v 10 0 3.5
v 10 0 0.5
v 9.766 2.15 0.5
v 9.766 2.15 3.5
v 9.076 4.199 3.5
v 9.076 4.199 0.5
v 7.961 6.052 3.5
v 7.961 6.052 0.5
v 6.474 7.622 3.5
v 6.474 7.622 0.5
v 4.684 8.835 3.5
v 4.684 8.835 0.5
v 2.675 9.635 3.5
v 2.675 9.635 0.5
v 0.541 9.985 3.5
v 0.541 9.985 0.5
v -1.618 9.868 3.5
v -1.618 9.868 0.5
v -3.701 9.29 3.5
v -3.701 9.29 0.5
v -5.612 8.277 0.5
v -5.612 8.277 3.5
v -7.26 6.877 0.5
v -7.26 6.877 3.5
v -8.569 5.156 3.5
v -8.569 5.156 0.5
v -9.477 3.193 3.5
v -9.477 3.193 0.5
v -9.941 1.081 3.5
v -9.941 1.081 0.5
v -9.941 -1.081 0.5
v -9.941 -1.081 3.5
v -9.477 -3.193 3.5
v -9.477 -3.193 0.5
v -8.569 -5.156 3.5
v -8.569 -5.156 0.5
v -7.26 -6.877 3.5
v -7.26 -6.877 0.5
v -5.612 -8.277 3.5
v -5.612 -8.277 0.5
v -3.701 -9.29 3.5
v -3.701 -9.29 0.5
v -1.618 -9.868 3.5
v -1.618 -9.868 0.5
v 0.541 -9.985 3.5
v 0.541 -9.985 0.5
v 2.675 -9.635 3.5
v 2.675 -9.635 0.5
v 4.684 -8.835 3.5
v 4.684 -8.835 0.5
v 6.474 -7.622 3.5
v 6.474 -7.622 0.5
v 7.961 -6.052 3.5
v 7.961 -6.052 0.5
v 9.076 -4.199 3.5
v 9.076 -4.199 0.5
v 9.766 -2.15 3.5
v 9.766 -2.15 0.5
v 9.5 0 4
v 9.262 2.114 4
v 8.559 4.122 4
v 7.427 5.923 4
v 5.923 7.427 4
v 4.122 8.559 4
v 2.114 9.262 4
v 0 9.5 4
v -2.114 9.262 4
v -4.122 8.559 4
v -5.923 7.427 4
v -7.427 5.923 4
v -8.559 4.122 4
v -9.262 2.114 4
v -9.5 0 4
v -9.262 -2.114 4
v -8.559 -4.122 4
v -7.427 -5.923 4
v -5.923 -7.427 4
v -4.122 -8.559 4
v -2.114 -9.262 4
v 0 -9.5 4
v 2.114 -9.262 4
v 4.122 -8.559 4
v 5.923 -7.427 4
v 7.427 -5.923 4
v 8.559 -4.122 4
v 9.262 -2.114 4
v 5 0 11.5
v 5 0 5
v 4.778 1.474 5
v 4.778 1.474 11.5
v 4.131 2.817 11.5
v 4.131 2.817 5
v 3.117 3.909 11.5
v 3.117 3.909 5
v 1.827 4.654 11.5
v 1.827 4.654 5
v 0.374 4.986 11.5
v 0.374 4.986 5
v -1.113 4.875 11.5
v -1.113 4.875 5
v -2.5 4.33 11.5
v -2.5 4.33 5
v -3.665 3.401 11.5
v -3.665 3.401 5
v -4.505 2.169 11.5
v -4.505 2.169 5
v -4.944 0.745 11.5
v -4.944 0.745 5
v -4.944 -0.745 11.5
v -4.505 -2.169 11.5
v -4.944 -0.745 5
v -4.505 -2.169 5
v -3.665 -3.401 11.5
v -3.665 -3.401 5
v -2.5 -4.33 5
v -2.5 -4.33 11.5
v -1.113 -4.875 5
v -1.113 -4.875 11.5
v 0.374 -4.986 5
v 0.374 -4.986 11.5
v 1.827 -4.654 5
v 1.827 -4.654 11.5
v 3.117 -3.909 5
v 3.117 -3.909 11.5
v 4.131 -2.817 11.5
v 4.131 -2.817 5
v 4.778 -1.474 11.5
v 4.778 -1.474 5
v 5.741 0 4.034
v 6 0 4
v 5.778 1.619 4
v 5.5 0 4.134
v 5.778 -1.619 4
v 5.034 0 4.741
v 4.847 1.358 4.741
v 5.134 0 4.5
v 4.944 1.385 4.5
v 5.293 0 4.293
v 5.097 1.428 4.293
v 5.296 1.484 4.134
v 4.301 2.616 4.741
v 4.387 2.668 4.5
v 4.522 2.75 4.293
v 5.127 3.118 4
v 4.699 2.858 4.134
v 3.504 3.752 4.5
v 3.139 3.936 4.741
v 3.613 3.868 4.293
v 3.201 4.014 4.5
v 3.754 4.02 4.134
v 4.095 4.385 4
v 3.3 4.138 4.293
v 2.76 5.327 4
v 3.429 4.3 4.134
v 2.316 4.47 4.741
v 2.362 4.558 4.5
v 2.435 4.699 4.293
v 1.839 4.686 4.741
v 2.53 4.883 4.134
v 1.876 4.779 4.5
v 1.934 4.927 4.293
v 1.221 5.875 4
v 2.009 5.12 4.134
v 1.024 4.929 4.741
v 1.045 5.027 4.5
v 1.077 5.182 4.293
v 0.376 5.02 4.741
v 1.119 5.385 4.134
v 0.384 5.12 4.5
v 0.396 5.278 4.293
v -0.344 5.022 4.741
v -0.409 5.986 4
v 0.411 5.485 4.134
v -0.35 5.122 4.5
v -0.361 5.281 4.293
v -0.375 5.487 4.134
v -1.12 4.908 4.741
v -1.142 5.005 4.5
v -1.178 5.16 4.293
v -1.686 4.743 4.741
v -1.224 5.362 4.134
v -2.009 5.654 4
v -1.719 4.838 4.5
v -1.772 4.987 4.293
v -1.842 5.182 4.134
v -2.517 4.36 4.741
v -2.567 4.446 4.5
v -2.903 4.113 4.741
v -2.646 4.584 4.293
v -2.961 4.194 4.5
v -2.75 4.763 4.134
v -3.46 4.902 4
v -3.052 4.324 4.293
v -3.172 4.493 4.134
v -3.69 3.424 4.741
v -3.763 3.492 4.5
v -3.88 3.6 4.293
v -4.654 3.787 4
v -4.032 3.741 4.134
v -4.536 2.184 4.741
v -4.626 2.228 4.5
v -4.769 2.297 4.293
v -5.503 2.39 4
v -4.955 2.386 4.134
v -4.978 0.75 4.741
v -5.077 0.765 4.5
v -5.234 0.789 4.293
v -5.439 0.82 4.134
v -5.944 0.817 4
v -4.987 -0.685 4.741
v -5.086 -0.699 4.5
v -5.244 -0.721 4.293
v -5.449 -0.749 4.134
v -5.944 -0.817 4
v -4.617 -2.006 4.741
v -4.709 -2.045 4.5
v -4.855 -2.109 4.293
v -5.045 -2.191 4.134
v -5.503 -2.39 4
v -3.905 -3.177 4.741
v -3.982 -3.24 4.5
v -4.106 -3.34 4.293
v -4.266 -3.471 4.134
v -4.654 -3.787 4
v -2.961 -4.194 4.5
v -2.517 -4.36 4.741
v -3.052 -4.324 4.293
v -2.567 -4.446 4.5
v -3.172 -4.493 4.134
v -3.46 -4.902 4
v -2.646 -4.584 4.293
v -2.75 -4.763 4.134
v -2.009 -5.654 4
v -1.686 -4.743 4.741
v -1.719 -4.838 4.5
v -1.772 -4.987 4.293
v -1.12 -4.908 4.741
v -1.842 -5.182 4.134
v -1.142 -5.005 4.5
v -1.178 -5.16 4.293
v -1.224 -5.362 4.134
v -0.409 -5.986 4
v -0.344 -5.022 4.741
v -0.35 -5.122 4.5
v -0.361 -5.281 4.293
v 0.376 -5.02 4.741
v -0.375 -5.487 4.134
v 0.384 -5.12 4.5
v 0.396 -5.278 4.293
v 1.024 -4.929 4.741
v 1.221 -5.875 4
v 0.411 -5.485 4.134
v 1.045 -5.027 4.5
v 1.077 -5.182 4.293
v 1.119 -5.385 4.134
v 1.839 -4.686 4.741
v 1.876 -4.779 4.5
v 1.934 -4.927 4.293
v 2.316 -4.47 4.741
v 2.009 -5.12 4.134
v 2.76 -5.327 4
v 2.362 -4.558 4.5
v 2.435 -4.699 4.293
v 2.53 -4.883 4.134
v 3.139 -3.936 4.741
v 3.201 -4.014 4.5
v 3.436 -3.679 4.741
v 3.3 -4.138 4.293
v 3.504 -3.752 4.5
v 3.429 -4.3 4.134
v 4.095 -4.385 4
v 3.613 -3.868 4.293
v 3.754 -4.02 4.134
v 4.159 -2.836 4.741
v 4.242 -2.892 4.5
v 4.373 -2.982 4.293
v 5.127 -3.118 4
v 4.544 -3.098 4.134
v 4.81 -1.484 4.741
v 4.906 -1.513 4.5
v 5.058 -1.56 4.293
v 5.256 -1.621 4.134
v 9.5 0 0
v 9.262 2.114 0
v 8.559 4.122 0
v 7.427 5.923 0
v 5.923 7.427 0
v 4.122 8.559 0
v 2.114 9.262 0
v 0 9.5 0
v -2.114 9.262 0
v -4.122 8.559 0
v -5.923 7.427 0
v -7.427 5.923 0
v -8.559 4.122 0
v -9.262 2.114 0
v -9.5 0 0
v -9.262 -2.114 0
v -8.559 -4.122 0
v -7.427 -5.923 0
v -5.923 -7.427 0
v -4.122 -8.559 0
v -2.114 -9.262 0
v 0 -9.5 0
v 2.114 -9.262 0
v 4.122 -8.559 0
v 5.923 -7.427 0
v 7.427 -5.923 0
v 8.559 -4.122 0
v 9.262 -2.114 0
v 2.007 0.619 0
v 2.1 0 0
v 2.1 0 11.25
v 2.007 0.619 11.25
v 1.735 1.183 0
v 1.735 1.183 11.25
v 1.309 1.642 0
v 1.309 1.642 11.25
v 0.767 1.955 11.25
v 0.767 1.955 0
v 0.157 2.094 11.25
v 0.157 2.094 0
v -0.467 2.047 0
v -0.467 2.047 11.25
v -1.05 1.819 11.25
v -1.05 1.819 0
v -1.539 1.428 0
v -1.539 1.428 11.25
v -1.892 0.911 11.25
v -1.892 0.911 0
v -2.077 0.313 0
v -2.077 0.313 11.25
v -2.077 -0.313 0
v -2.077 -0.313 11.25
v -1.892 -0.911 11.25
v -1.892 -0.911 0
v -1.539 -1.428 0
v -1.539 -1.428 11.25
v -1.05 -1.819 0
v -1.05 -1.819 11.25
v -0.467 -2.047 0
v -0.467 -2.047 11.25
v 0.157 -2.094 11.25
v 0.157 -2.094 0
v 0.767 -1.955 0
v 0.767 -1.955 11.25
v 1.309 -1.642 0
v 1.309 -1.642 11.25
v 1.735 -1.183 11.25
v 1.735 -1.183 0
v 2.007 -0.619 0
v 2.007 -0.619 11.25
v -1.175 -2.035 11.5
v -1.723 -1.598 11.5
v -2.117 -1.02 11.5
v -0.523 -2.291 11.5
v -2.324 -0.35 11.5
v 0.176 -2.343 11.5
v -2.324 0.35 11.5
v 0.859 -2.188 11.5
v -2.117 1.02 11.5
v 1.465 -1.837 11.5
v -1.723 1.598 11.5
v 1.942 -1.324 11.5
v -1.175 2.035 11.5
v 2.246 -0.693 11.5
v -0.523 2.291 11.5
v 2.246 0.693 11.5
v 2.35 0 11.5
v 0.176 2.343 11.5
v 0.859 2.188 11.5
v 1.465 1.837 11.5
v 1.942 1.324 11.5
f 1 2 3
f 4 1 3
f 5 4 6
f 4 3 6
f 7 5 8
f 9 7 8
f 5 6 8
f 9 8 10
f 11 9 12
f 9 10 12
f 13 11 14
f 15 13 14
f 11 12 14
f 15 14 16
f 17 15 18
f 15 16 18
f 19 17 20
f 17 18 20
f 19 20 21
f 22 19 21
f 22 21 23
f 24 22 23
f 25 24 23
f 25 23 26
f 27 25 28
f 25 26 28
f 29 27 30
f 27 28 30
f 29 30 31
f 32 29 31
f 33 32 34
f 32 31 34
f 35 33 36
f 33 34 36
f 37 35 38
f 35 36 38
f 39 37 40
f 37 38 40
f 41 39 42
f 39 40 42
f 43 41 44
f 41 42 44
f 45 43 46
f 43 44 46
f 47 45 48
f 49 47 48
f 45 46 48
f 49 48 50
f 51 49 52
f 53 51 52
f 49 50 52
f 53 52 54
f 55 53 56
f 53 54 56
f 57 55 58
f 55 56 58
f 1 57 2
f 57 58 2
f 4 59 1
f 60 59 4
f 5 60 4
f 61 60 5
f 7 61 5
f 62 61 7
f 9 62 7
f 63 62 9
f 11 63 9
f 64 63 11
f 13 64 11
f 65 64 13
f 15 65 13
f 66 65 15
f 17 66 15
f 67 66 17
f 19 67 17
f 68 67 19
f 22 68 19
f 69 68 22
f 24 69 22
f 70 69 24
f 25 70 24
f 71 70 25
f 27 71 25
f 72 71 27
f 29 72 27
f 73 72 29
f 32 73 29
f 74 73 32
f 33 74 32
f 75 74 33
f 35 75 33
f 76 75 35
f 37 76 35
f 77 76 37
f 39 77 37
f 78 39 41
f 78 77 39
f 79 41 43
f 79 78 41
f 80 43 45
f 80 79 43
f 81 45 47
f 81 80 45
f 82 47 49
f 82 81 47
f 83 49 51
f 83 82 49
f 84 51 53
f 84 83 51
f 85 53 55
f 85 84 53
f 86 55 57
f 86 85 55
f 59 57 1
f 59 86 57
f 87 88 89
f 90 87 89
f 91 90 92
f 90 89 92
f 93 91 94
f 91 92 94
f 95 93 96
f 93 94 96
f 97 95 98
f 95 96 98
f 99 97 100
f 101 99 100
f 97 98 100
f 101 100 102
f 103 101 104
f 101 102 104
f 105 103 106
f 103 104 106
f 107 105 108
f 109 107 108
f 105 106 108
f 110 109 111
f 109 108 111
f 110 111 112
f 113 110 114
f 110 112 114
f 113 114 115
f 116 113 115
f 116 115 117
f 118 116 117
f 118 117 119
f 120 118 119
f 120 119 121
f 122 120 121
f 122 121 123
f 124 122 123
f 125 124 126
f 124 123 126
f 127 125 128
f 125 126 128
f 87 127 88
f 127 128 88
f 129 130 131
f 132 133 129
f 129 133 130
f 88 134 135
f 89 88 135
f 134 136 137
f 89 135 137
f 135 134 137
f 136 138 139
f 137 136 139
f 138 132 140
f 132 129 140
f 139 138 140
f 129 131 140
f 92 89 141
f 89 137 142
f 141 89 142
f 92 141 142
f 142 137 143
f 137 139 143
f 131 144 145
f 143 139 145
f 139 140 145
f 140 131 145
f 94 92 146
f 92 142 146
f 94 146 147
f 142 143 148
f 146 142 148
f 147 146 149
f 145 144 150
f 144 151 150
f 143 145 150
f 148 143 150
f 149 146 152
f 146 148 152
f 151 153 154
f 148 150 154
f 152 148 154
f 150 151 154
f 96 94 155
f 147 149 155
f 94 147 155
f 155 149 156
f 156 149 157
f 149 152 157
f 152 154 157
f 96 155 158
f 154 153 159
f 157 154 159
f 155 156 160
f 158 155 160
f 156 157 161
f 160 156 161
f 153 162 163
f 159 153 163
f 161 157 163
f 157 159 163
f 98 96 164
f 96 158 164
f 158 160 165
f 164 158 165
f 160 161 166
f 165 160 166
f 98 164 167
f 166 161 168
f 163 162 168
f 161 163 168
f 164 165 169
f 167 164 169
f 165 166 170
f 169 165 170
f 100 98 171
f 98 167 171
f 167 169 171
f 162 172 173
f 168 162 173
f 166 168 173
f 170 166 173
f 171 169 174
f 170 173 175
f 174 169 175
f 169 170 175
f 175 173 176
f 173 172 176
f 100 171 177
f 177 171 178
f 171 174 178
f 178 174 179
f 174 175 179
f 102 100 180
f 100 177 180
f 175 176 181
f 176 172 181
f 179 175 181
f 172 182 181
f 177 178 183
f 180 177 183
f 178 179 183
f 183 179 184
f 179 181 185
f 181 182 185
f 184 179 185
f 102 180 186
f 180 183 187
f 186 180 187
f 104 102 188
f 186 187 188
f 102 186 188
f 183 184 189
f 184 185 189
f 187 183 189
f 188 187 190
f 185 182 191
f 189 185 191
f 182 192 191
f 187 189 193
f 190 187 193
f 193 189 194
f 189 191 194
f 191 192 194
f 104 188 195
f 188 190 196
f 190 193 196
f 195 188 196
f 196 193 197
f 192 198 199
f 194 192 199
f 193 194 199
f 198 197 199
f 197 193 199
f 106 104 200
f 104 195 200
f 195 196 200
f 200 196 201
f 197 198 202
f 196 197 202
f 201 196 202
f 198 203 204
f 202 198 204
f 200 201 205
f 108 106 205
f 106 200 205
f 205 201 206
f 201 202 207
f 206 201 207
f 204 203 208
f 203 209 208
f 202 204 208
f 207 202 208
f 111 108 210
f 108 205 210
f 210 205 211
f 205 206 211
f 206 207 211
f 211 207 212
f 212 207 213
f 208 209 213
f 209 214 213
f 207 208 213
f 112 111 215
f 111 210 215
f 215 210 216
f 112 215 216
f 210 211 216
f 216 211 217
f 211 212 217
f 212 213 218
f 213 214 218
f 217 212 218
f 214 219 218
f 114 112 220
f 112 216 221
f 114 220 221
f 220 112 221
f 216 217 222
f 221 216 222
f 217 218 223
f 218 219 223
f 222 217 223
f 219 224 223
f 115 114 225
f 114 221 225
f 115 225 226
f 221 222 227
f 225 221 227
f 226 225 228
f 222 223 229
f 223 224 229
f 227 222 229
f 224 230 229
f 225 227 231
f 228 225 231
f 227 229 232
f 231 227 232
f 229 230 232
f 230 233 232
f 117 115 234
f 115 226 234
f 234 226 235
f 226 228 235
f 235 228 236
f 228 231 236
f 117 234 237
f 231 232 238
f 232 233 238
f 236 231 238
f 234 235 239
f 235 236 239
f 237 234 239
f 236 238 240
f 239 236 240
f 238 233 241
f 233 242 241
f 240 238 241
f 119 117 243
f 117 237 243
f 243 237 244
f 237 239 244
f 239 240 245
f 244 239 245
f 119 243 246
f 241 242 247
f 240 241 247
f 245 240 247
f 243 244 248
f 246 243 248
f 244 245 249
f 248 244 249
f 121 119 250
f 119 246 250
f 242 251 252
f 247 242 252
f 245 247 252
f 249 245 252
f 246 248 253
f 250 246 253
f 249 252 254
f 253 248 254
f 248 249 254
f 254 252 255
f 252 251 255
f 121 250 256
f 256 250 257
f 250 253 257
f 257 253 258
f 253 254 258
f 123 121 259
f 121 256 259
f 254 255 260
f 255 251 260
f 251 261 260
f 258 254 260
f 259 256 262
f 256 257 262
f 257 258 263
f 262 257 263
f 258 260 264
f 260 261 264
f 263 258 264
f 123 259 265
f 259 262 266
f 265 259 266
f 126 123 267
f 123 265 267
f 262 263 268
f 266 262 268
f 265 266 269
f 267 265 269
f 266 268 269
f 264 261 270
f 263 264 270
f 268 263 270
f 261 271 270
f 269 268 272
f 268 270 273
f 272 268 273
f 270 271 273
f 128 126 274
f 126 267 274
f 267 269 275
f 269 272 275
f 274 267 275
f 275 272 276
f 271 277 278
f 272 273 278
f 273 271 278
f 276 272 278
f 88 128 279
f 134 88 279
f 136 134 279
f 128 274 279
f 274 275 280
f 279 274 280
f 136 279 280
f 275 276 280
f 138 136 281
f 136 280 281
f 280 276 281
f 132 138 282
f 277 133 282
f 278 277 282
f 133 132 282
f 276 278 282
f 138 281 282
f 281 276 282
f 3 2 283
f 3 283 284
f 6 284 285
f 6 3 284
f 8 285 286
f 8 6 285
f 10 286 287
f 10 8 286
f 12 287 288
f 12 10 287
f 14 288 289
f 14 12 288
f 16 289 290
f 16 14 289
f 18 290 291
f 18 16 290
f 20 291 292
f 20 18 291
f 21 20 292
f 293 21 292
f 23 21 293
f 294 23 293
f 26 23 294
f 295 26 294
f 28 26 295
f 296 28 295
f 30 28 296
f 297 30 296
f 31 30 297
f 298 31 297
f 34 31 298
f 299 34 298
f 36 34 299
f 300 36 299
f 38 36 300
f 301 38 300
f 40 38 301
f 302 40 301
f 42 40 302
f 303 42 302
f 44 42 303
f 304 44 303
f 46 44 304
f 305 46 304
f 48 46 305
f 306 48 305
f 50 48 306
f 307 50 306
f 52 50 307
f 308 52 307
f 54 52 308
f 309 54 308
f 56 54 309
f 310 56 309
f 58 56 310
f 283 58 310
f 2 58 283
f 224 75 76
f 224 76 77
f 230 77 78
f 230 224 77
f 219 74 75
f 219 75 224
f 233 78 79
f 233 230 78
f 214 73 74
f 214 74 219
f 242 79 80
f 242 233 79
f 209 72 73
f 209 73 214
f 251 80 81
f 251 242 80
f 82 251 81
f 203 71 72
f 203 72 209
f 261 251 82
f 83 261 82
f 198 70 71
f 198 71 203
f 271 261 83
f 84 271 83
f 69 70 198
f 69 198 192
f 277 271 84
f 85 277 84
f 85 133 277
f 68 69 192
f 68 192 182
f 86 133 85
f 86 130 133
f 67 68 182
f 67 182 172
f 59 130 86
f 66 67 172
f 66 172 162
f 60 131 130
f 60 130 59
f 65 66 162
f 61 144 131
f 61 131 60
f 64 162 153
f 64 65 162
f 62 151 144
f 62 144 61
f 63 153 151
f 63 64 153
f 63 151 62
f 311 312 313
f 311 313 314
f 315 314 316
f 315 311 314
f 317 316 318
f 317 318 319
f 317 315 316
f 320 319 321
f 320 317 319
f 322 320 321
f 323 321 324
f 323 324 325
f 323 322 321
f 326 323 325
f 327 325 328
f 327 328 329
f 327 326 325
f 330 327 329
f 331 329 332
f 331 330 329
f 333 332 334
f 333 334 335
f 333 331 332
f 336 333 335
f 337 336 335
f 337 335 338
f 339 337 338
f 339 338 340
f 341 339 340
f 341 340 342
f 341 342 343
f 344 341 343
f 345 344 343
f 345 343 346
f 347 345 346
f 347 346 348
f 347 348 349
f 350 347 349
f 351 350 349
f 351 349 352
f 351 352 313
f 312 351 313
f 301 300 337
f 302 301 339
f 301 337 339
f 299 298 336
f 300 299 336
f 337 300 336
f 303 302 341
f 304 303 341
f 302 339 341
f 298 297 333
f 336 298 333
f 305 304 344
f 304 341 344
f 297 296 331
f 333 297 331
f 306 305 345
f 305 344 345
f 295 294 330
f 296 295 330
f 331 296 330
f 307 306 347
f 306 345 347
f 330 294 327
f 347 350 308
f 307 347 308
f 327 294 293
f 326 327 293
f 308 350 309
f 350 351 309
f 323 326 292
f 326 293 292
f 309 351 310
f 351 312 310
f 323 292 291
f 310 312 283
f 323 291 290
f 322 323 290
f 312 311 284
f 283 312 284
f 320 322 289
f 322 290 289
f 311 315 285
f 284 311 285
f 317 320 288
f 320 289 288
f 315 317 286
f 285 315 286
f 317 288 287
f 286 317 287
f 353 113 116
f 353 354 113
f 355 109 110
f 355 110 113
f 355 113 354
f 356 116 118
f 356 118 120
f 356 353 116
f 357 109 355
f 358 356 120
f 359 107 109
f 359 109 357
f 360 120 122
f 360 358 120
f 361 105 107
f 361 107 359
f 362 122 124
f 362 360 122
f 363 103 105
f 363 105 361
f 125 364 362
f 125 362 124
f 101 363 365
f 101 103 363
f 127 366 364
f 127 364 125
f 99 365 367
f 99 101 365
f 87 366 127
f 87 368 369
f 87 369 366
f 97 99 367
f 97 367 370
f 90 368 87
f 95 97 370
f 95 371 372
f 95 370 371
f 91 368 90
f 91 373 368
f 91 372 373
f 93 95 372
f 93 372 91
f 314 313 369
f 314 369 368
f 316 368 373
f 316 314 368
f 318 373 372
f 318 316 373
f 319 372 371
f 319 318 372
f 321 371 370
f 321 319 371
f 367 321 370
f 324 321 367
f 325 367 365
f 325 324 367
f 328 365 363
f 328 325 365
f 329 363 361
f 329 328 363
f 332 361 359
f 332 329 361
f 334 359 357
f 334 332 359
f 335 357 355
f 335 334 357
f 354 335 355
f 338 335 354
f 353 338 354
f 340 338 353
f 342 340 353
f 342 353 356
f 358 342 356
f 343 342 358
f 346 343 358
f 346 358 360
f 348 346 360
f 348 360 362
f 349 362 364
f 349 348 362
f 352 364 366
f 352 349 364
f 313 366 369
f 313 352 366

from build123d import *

# Parameters (mm, degrees)
CROQUIS1_R              = 10
CROQUIS1_R_2            = 2.1
SALIENTE_EXTRUIR1_DEPTH = 4
CROQUIS2_R              = 5
CROQUIS2_R_2            = 2.1
SALIENTE_EXTRUIR2_DEPTH = 7.5
CHAFL_N1_SIZE           = 0.5
REDONDEO1_R             = 1
CHAFL_N2_SIZE           = 0.25


with BuildPart() as part:
    # Croquis1 → Saliente-Extruir1 (new body)
    with BuildSketch(Plane.XY):
        Circle(CROQUIS1_R)
        Circle(CROQUIS1_R_2, mode=Mode.SUBTRACT)
    extrude(amount=SALIENTE_EXTRUIR1_DEPTH)

    # Croquis2 → Saliente-Extruir2 (add)
    with BuildSketch(Plane.XY.offset(4)):
        Circle(CROQUIS2_R)
        Circle(CROQUIS2_R_2, mode=Mode.SUBTRACT)
    extrude(amount=SALIENTE_EXTRUIR2_DEPTH)

    # Chaflán1
    chafl_n1_edges = [part.edges().sort_by_distance(p)[0] for p in [
        (-10, 0, 0),
        (-10, 0, 4),
    ]]
    chamfer(chafl_n1_edges, length=CHAFL_N1_SIZE)

    # Redondeo1
    redondeo1_edges = [part.edges().sort_by_distance(p)[0] for p in [
        (-5, 0, 4),
    ]]
    fillet(redondeo1_edges, radius=REDONDEO1_R)

    # Chaflán2
    chafl_n2_edges = [part.edges().sort_by_distance(p)[0] for p in [
        (-2.1, 0, 11.5),
    ]]
    chamfer(chafl_n2_edges, length=CHAFL_N2_SIZE)


solid = part.part
